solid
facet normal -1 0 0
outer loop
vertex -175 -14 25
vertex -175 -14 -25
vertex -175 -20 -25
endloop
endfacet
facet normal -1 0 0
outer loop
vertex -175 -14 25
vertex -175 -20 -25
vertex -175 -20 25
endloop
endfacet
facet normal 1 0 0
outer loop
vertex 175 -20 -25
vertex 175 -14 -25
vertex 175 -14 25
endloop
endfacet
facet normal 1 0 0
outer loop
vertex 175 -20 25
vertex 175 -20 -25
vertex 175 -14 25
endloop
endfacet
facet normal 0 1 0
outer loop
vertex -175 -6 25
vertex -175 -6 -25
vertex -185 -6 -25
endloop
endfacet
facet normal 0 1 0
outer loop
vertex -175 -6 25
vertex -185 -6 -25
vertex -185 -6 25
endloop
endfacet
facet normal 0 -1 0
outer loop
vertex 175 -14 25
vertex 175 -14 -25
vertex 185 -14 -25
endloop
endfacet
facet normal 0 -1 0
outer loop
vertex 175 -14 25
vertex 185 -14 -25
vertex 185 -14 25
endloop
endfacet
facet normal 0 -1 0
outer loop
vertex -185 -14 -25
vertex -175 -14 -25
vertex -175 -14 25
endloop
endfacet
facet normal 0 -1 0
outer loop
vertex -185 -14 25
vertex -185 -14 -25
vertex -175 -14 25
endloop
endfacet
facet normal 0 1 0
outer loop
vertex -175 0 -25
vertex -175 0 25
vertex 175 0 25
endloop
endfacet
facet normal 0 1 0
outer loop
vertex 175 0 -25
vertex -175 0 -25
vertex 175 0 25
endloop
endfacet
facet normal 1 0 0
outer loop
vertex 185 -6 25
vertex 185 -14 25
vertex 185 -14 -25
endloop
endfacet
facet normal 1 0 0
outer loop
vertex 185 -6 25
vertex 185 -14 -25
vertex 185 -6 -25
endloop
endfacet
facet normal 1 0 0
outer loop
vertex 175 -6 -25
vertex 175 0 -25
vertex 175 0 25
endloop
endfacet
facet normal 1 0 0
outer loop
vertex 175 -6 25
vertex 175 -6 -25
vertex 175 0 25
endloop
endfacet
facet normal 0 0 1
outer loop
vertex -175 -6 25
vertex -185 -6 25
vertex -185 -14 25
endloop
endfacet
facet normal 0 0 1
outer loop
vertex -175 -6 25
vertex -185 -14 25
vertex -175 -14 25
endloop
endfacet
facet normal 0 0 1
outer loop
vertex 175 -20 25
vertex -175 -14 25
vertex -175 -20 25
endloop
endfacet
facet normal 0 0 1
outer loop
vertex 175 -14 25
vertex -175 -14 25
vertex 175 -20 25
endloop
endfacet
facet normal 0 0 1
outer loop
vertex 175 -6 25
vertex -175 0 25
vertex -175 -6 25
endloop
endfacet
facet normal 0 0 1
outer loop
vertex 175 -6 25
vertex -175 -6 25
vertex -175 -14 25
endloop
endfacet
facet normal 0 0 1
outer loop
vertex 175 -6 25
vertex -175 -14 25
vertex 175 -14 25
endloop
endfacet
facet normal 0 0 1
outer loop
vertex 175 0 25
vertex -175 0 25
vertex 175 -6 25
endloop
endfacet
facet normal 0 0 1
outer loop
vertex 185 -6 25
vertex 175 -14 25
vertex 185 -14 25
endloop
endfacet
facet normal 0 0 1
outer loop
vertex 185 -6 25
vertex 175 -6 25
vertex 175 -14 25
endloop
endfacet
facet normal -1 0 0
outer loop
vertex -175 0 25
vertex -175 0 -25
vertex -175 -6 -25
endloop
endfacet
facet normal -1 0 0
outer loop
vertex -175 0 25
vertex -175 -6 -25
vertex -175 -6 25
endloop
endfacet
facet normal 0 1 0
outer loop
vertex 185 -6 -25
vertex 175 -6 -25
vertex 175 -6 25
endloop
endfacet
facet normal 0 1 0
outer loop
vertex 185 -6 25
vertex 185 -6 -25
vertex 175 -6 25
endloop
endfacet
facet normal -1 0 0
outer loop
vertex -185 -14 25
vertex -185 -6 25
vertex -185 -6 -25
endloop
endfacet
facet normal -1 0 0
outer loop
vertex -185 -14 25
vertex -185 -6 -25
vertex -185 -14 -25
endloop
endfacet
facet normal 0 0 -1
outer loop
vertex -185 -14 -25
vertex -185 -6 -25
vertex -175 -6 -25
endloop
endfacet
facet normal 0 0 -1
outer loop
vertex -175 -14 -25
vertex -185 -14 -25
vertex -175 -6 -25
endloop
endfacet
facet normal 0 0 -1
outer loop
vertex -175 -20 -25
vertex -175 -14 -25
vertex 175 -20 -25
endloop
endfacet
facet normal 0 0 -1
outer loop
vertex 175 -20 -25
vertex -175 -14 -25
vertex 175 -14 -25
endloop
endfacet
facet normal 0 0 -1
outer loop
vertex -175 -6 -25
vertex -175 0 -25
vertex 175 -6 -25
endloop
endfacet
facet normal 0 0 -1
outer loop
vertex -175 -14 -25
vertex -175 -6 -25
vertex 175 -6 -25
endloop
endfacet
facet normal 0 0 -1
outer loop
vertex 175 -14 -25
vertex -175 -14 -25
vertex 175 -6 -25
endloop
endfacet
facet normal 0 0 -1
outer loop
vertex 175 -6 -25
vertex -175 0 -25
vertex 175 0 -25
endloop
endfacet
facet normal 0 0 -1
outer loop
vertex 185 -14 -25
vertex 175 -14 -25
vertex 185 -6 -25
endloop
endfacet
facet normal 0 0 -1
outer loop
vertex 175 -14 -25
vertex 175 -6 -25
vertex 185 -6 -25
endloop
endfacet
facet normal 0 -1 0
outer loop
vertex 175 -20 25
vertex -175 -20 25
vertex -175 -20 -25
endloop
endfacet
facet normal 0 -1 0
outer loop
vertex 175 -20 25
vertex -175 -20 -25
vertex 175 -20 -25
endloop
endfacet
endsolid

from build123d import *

# Parameters (mm, degrees)
F0_W     = 350
F0_H     = 50
F1_DEPTH = 20
F2_W     = 8
F2_H     = 50
F3_DEPTH = 10
F4_W     = 8
F4_H     = 50
F5_DEPTH = 10


with BuildPart() as f1:
    # F0 (on Front) → F1 (new body)
    with BuildSketch(Plane.XZ):
        Rectangle(F0_W, F0_H)
    extrude(amount=F1_DEPTH)

    # F2 (on face) → F3 (join)
    with BuildSketch(Plane(origin=(-175, 0, 0), x_dir=(0, -1, 0), z_dir=(-1, 0, 0))):
        with Locations((10, 0)):
            Rectangle(F2_W, F2_H)
    extrude(amount=F3_DEPTH)

    # F4 (on face) → F5 (join)
    with BuildSketch(Plane.YZ.offset(175)):
        with Locations((-10, 0)):
            Rectangle(F4_W, F4_H)
    extrude(amount=F5_DEPTH)


solid = f1.part
